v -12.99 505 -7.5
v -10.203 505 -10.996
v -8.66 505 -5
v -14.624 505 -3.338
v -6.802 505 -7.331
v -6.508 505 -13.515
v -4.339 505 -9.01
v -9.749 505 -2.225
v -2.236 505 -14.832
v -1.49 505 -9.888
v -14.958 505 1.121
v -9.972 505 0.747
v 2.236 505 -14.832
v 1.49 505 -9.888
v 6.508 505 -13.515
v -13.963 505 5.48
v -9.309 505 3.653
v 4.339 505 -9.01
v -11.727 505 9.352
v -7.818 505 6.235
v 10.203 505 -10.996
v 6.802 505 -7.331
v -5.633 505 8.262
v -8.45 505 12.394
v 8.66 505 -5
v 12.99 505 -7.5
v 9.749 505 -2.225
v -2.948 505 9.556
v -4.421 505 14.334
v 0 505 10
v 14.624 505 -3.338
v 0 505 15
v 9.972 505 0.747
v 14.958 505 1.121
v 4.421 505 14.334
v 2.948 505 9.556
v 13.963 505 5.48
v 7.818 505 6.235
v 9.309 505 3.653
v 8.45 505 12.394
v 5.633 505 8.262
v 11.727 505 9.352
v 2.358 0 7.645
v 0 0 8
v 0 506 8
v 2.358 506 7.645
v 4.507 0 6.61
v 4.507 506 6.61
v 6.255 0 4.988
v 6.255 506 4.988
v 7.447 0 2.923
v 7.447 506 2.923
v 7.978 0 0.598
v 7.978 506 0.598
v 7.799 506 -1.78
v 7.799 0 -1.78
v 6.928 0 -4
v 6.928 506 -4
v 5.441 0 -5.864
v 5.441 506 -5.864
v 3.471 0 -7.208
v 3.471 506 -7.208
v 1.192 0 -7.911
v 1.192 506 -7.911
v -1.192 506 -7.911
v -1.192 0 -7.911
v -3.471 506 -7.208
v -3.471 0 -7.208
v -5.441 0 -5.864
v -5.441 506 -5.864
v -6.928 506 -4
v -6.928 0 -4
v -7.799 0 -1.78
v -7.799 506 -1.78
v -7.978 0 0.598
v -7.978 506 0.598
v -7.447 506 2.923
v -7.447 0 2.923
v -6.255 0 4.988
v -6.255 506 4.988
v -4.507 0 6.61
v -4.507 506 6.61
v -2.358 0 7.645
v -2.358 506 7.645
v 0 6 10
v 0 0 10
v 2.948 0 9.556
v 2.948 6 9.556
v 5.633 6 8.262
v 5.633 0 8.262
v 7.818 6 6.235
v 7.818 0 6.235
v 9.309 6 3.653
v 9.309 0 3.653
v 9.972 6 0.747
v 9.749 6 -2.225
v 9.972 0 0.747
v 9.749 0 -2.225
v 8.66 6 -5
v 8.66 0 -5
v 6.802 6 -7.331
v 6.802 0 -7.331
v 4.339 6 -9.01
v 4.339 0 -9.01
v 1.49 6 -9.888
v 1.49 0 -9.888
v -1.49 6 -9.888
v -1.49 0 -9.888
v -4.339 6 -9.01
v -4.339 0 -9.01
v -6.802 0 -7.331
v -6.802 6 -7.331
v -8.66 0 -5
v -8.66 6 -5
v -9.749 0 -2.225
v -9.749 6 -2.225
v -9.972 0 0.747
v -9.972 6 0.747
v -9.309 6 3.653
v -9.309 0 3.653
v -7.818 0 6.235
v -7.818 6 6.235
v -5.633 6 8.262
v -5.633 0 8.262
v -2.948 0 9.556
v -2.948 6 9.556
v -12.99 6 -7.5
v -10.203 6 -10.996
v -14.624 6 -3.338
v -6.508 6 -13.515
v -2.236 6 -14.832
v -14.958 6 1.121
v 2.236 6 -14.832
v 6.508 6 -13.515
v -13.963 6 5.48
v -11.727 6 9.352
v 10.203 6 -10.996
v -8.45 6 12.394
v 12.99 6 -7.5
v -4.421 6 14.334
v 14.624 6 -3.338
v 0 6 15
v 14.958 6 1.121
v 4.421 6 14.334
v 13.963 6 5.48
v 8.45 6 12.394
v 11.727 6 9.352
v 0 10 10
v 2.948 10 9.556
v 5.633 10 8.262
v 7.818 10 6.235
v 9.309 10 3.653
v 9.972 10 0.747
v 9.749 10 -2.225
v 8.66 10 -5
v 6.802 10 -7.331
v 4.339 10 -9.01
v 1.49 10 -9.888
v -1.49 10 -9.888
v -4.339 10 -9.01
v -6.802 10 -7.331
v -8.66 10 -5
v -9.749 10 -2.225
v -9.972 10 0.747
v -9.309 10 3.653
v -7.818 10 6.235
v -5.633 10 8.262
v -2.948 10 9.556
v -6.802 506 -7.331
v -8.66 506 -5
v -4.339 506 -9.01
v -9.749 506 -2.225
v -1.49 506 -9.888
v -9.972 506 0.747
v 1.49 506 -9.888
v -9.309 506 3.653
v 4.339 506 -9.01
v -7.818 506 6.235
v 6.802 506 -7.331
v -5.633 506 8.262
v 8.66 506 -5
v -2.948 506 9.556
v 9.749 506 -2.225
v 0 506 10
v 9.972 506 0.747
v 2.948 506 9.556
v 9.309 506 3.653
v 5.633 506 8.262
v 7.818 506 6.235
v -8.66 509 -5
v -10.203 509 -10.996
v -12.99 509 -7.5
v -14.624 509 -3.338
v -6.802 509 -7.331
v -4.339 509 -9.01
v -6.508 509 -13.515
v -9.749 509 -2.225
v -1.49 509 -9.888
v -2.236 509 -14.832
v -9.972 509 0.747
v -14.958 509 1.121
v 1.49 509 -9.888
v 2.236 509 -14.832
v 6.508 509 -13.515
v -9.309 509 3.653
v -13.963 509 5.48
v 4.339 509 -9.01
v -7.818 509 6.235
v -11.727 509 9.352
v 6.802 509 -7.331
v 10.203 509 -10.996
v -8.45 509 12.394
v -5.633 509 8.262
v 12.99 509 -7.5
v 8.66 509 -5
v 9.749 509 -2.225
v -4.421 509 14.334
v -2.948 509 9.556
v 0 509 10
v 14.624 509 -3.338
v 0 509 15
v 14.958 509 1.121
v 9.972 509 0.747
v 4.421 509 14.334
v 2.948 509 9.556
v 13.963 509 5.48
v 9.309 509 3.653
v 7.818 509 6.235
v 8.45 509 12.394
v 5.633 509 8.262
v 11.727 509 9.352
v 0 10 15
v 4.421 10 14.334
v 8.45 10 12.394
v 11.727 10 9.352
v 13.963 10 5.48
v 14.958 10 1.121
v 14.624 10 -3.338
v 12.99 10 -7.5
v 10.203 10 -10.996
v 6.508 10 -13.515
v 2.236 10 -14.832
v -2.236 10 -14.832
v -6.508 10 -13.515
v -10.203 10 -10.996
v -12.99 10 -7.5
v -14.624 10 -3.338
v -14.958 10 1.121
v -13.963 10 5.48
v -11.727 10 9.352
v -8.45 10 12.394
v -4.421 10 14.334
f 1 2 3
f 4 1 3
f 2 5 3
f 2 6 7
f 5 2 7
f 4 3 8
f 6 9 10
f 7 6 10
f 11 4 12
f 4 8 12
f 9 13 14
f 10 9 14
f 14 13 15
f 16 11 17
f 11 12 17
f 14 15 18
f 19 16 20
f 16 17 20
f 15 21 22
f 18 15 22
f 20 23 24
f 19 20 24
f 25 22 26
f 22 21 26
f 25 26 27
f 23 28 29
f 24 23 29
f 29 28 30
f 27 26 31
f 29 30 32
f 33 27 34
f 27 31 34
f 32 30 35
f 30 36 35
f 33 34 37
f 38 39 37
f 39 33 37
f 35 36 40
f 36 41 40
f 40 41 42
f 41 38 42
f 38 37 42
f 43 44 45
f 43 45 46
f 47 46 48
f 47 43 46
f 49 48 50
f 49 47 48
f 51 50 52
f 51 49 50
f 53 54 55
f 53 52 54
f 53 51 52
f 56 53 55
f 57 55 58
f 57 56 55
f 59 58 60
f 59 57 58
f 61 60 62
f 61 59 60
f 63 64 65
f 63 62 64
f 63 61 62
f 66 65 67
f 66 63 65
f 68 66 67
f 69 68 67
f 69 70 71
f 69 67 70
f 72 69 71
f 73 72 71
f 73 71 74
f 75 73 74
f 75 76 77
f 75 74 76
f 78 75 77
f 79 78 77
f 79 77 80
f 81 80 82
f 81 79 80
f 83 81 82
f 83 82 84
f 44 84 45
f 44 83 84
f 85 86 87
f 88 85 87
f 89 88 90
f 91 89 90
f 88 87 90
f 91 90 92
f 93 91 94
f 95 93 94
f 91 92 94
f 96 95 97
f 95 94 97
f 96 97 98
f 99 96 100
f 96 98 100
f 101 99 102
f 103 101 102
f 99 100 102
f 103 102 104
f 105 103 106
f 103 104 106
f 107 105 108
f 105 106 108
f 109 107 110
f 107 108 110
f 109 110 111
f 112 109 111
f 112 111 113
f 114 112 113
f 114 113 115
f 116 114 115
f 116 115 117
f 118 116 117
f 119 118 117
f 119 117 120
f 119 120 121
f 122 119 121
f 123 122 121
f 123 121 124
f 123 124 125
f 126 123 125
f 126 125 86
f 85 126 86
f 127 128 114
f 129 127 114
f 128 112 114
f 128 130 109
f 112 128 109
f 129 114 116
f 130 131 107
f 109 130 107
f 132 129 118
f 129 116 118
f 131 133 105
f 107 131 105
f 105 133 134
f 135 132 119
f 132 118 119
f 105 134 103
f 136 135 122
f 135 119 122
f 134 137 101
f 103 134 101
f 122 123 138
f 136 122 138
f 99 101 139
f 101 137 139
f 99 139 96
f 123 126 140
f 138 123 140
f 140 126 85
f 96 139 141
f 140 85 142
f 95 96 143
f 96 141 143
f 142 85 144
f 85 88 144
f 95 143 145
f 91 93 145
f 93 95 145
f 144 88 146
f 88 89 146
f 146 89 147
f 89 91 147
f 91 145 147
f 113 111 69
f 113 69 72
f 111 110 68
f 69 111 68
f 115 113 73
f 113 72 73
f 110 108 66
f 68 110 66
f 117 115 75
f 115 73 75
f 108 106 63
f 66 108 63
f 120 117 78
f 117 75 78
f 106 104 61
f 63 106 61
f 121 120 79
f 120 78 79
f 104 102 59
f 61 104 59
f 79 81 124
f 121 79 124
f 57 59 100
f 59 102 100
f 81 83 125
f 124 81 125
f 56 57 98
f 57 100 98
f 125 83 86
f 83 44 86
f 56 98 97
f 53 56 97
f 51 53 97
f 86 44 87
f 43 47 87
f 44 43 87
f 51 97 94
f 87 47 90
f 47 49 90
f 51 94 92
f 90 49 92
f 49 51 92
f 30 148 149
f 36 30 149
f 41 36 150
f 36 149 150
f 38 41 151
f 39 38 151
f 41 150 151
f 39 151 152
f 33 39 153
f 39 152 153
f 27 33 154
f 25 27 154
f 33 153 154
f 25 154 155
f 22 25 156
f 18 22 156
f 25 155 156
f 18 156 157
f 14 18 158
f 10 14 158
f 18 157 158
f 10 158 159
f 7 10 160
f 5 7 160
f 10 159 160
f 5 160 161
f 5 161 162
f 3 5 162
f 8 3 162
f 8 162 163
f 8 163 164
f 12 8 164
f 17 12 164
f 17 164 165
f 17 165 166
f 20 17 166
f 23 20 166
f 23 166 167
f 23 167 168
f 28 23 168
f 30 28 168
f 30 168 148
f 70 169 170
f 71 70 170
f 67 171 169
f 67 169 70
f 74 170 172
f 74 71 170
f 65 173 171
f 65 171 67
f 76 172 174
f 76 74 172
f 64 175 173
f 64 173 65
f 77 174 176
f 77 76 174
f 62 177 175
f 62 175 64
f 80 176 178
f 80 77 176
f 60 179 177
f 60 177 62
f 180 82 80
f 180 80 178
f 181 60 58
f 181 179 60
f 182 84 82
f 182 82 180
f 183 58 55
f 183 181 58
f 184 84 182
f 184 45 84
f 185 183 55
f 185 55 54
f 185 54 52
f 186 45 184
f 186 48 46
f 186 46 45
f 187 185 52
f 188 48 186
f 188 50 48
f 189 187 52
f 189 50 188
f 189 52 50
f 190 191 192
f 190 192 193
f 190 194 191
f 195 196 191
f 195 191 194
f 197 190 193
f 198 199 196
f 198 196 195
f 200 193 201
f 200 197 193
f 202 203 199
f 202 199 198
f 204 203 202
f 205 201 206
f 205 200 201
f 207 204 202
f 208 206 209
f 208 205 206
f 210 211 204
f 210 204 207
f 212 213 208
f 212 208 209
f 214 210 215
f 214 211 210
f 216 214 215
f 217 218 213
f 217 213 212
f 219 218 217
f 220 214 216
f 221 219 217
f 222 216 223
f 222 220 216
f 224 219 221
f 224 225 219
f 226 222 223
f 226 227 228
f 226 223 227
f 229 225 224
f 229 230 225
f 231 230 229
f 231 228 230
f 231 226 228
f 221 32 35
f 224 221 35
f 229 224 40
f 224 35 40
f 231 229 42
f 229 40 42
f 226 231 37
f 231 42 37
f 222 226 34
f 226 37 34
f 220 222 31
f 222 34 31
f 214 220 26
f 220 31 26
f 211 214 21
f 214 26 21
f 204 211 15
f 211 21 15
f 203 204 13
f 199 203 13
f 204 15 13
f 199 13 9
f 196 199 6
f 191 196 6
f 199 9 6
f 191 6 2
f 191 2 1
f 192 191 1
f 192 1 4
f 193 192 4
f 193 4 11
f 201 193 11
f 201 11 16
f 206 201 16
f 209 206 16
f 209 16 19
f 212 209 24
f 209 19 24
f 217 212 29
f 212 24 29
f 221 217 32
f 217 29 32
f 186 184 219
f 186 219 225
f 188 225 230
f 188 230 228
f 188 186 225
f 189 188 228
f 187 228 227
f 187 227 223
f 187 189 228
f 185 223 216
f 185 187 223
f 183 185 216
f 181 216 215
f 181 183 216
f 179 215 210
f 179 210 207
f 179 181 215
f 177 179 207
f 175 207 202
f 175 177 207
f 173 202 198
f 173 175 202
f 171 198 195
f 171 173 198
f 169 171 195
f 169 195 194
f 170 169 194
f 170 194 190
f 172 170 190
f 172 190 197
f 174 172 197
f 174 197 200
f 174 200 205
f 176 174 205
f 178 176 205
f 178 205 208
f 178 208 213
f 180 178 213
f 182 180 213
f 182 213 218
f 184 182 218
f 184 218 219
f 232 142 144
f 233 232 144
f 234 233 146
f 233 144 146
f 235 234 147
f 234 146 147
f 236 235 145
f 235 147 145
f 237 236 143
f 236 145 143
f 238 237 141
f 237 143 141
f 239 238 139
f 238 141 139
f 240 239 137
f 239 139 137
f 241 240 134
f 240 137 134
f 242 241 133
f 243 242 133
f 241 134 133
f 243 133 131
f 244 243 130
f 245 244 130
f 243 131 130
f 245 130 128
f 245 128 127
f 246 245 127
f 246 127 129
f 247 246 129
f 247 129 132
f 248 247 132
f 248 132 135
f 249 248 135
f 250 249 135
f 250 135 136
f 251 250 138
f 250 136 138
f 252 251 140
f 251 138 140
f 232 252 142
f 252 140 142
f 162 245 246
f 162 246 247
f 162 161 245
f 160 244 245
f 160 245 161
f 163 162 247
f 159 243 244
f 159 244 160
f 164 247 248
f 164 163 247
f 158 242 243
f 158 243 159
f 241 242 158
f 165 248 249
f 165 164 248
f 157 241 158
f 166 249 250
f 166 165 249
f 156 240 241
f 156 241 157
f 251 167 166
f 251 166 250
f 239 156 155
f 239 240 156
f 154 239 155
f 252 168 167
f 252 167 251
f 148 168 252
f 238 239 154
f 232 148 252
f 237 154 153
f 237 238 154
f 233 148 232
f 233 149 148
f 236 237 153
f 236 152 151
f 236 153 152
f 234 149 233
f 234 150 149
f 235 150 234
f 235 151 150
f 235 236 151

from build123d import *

# Parameters (mm, degrees)
SKETCH1_R           = 10
BOSS_EXTRUDE1_DEPTH = 506
SHELL1_T            = -2
BOSS_EXTRUDE2_START = -1
SKETCH2_R           = 15
SKETCH2_R_2         = 10
BOSS_EXTRUDE2_DEPTH = 4
LPATTERN1_COUNT     = 2
LPATTERN1_PITCH     = 499


with BuildPart() as part:
    # Sketch1 → Boss-Extrude1 (new body)
    with BuildSketch(Plane(origin=(0, 0, 0), x_dir=(1, 0, 0), z_dir=(0, 1, 0))):
        with Locations(Location((0, 0, 0), (0, 0, 270))):
            Circle(SKETCH1_R)
    extrude(amount=BOSS_EXTRUDE1_DEPTH)

    # Shell1
    shell1_openings = [part.faces().sort_by_distance(p)[0] for p in [
        (0, 506, 0),
        (0, 0, 0),
    ]]
    offset(amount=SHELL1_T, openings=shell1_openings, kind=Kind.INTERSECTION)

    # Sketch2 → Boss-Extrude2 (add)
    with BuildSketch(Plane(origin=(0, 506, 0), x_dir=(1, 0, 0), z_dir=(0, 1, 0)).offset(BOSS_EXTRUDE2_START)):
        with Locations(Location((0, 0, 0), (0, 0, 270))):
            Circle(SKETCH2_R)
        with Locations(Location((0, 0, 0), (0, 0, 270))):
            Circle(SKETCH2_R_2, mode=Mode.SUBTRACT)
    boss_extrude2 = extrude(amount=BOSS_EXTRUDE2_DEPTH)

    # LPattern1: Boss-Extrude2 ×2
    with Locations(*[(0, -i * LPATTERN1_PITCH, 0) for i in range(1, LPATTERN1_COUNT)]):
        add(boss_extrude2)


solid = part.part
